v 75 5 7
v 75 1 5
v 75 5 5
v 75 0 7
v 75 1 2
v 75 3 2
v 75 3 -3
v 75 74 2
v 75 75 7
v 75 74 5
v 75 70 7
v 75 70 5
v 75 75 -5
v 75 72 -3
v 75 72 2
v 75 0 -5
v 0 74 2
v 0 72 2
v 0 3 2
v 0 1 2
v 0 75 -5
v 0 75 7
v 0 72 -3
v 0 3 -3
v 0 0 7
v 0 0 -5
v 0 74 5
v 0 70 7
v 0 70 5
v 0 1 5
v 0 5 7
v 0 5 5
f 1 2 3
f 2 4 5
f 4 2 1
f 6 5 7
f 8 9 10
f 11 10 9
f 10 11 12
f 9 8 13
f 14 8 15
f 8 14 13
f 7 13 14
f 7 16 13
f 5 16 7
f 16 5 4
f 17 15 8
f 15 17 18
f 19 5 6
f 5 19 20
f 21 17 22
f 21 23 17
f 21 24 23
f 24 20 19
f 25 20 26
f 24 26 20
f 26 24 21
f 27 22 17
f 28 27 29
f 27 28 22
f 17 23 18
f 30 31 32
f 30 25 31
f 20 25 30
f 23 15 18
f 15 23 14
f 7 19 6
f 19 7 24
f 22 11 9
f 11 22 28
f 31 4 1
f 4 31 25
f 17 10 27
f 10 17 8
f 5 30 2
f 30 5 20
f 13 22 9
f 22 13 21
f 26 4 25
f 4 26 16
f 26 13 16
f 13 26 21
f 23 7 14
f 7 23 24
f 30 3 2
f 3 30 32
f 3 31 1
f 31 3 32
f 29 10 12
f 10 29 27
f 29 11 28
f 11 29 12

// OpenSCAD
l = 75;
w = 75;
translate([0, 1, 5]){
	cube([l, 4, 2]);
}
translate([0, w - 5, 5]){
	cube([l, 4, 2]);
}

difference(){
	cube([l, w, 7]);
	union(){
		translate([0, 3, 0]){
			cube([l, w - 6, 2]);
		}
		translate([0, 1, 2]){
			cube([l, w - 2, 5]);
		}
	}
}

difference(){
	translate([0, 0, -5]){
		cube([l, w, 5]);
	}
	translate([0, 3, -3]){
		cube([l, w - 6, 3]);
	}
}
